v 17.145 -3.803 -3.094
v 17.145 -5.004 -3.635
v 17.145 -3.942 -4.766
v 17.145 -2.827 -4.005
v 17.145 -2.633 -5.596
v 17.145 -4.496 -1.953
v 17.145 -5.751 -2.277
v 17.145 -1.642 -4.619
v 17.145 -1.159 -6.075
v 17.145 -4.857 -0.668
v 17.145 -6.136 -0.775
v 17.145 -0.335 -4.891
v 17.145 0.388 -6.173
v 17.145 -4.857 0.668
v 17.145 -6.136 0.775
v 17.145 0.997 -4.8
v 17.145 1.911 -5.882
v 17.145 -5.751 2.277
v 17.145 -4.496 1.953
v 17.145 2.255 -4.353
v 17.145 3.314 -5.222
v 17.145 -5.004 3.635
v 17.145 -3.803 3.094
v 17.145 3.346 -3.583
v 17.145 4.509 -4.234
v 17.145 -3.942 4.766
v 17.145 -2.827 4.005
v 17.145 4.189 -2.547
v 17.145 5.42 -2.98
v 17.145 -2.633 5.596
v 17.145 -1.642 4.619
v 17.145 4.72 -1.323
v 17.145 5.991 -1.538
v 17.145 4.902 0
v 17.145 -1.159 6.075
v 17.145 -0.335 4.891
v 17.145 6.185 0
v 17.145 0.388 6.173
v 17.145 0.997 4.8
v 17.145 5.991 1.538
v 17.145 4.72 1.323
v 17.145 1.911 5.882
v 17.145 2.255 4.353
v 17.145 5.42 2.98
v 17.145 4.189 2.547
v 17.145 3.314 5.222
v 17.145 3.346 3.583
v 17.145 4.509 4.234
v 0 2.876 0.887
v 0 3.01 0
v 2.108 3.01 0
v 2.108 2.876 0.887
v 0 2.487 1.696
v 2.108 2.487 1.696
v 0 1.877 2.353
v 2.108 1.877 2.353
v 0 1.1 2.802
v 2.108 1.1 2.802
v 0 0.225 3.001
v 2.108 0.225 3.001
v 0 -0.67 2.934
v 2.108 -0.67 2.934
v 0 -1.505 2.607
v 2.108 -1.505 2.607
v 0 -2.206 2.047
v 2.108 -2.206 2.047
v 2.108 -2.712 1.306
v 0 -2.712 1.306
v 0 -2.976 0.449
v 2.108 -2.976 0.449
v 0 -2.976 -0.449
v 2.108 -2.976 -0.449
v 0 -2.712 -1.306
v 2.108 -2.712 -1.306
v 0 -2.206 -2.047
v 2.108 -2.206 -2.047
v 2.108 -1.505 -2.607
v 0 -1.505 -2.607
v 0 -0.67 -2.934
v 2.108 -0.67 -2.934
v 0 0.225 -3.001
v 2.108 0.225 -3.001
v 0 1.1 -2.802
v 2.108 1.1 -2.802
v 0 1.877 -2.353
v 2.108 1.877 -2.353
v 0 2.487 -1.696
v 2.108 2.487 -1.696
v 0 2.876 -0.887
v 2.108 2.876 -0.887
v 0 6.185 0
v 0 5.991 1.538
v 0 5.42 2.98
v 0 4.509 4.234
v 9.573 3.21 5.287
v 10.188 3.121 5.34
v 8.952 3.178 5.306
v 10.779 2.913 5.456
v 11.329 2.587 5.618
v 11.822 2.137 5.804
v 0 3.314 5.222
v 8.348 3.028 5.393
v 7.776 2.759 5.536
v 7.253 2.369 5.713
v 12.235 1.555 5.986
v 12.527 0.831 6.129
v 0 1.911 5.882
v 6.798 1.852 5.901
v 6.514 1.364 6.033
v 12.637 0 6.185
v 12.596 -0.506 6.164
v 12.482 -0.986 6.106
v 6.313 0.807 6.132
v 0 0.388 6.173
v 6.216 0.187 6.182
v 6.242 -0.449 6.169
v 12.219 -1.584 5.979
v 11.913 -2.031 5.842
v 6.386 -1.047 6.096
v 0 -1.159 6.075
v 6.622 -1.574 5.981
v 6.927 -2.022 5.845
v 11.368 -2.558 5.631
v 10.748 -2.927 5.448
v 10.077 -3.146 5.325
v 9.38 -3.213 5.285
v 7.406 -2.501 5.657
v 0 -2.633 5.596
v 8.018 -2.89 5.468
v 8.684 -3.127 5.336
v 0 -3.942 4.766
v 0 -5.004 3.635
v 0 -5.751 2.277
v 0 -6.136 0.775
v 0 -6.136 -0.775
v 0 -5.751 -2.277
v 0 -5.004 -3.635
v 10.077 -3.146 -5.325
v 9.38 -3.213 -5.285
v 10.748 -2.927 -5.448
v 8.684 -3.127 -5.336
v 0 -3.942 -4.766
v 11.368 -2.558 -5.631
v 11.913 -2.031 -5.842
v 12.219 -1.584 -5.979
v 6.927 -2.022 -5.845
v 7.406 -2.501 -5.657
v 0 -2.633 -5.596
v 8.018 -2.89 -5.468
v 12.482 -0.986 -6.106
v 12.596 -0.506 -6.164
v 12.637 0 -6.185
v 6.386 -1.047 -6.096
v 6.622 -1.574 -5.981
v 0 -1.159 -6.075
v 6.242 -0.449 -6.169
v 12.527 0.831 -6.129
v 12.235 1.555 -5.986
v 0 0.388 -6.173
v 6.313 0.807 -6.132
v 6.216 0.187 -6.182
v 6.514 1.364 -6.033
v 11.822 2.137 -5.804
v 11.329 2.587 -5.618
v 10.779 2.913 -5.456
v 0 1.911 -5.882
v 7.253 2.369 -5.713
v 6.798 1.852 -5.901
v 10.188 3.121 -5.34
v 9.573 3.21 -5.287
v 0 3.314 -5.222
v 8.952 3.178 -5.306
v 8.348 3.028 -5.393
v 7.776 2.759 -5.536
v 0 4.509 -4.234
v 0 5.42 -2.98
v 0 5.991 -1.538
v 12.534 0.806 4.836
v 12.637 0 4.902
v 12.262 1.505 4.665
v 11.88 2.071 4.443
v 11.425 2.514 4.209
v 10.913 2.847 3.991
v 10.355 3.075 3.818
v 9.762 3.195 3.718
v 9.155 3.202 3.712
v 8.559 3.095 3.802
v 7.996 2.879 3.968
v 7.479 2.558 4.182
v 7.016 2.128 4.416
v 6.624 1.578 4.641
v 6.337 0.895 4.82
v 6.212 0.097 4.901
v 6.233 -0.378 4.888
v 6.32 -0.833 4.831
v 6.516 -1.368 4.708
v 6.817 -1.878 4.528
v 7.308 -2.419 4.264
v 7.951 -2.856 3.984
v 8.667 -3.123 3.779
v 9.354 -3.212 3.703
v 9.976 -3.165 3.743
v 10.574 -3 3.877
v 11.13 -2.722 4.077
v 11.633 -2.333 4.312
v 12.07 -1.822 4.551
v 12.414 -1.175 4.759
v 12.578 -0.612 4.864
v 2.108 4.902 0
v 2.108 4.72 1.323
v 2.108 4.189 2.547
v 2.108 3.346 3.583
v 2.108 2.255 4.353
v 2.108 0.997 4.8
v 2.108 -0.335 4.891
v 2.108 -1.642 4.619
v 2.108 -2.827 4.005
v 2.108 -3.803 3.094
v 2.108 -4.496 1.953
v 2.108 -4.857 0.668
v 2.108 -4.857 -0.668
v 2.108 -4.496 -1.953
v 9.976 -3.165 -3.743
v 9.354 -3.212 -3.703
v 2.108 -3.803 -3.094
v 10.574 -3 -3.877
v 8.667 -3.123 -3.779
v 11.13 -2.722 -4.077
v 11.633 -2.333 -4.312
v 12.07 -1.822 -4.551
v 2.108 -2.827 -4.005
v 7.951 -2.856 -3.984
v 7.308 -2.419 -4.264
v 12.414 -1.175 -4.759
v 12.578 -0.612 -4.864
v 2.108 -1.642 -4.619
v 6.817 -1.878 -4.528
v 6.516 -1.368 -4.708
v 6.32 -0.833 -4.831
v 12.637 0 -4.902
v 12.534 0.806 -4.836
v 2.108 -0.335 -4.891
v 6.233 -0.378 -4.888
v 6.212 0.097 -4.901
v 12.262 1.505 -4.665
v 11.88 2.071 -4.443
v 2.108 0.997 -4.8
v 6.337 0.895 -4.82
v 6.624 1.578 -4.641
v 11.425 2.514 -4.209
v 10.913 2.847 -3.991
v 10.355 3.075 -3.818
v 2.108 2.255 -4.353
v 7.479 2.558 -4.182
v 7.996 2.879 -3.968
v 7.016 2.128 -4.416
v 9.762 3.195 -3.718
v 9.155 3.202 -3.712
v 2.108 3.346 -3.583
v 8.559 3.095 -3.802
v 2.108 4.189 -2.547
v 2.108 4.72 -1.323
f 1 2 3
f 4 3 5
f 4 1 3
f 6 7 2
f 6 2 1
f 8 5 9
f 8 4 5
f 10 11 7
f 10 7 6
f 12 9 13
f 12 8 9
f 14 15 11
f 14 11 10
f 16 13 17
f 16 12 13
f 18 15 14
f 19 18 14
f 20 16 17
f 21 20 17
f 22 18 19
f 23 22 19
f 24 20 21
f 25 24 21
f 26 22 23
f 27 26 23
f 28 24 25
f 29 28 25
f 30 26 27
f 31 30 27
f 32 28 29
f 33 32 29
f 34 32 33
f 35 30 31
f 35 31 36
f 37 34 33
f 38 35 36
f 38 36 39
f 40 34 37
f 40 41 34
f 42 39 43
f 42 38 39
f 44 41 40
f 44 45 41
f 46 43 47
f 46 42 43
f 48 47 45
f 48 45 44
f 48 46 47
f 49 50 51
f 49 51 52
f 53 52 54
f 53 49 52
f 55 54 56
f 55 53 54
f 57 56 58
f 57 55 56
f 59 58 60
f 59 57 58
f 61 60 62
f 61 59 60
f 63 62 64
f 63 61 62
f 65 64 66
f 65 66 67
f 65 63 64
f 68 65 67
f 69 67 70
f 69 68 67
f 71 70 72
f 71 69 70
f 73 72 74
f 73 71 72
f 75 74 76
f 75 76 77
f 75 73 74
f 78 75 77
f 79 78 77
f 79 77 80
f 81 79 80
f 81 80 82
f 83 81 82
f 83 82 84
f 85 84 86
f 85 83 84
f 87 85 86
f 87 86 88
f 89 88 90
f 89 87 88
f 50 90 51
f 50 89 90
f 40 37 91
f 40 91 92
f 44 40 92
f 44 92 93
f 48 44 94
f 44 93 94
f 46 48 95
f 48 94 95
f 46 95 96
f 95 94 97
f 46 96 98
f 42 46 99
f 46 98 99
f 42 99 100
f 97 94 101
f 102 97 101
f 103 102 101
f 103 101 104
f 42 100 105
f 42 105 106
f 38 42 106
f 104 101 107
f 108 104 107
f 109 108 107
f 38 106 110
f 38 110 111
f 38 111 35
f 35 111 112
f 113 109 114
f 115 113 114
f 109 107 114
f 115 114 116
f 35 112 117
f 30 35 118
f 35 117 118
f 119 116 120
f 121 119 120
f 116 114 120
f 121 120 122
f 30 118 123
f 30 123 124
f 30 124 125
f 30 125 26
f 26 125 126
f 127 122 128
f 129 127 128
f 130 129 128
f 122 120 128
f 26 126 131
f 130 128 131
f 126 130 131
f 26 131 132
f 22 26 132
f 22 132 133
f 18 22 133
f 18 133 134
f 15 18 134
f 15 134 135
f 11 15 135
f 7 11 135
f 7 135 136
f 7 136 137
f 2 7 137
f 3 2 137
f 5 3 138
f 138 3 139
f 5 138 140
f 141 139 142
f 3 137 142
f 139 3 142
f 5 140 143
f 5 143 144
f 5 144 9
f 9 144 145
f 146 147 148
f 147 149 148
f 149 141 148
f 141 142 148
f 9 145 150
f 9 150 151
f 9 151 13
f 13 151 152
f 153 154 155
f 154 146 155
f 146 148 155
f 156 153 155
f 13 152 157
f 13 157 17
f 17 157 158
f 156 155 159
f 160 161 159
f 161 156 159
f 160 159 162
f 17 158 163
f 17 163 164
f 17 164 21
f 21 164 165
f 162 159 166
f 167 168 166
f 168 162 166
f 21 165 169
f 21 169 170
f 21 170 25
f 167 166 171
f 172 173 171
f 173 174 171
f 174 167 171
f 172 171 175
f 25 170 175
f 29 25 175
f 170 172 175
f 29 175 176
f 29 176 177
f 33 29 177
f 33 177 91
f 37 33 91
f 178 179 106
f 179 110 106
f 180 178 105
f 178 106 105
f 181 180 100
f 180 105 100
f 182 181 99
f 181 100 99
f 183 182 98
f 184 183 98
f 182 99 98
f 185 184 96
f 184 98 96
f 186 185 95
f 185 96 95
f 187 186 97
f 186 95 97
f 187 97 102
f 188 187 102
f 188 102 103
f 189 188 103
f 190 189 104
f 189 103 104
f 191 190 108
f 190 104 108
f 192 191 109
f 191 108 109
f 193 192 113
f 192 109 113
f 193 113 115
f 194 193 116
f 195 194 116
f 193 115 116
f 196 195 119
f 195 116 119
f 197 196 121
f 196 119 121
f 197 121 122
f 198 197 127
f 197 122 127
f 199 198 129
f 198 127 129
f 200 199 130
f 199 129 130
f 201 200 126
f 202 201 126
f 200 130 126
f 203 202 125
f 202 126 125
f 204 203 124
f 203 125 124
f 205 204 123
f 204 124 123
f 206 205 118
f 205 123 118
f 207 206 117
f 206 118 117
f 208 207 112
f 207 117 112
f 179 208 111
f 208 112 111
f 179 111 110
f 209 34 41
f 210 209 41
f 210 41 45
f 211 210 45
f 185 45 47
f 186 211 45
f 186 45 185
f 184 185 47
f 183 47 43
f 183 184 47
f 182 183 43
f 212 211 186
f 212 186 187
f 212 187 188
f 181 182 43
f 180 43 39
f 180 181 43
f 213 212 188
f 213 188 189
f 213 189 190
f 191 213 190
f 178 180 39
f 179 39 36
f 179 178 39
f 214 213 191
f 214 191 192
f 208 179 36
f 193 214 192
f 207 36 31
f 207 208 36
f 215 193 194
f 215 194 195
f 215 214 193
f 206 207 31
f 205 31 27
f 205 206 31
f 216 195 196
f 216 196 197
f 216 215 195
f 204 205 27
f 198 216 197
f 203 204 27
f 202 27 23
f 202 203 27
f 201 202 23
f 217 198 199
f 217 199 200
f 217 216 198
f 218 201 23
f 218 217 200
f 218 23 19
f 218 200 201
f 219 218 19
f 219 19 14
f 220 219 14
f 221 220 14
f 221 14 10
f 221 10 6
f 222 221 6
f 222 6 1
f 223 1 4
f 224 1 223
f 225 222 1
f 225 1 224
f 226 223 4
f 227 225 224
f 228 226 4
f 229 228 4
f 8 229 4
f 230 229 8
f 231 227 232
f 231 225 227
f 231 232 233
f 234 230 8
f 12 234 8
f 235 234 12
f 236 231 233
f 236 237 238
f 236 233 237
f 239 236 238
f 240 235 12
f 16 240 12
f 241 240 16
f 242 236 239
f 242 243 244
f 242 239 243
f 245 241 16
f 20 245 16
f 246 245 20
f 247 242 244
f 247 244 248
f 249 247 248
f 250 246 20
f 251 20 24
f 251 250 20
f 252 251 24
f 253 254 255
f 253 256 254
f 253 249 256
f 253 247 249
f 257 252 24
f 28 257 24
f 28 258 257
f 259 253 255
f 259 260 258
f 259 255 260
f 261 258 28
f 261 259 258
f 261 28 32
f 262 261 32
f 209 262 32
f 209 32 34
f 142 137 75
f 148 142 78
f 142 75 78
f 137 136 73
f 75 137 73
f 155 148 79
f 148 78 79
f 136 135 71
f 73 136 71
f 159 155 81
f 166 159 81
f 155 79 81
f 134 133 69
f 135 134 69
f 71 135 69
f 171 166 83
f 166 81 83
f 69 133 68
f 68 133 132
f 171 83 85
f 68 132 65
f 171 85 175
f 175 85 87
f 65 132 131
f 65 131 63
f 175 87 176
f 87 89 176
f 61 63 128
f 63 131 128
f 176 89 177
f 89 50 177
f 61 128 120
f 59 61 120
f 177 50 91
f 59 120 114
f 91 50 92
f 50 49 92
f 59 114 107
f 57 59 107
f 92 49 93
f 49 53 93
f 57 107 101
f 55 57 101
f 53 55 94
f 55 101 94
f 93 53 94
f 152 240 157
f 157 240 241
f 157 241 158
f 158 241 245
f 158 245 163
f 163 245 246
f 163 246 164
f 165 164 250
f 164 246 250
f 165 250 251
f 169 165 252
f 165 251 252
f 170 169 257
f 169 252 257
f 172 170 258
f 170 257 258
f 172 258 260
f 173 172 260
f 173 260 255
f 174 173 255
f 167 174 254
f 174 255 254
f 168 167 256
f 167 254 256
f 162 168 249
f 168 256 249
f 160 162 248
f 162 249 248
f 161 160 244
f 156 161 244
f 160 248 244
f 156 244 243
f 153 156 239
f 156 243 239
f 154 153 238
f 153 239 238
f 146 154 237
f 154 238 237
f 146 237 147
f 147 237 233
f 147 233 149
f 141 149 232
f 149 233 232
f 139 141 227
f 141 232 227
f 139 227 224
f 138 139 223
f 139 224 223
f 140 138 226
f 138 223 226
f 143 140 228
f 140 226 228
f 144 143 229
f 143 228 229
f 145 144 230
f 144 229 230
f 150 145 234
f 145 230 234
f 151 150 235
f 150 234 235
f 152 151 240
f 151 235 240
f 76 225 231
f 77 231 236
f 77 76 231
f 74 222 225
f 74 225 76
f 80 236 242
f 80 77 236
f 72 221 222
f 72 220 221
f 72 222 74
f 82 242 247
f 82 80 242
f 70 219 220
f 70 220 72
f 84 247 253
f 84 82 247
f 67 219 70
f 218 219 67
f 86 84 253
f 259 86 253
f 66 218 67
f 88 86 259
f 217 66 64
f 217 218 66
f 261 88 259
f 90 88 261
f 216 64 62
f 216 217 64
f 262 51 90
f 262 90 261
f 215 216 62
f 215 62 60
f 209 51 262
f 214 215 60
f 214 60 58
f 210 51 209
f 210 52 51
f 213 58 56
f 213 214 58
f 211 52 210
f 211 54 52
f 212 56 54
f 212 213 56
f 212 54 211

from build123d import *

# Parameters (mm, degrees)
F0_R     = 6.1849
F0_R_2   = 4.9022
F0_R_3   = 3.0099
F1_DEPTH = 2.1082
F2_DEPTH = 17.145
F3_R     = 3.2131
F4_DEPTH = 12.7


with BuildPart() as f1:
    # F0 (on Right) → F1 (new body)
    with BuildSketch(Plane.YZ):
        Circle(F0_R)
        Circle(F0_R_2, mode=Mode.SUBTRACT)
        Circle(F0_R_2)
        Circle(F0_R_3, mode=Mode.SUBTRACT)
    extrude(amount=F1_DEPTH)

    # F0 (on Right) → F2 (join)
    with BuildSketch(Plane.YZ):
        Circle(F0_R)
        Circle(F0_R_2, mode=Mode.SUBTRACT)
    extrude(amount=F2_DEPTH)

    # F3 (on Top) → F4 (cut, symmetric)
    with BuildSketch(Plane.XY):
        with Locations((9.4234, 0)):
            Circle(F3_R)
    extrude(amount=F4_DEPTH, both=True, mode=Mode.SUBTRACT)


solid = f1.part
